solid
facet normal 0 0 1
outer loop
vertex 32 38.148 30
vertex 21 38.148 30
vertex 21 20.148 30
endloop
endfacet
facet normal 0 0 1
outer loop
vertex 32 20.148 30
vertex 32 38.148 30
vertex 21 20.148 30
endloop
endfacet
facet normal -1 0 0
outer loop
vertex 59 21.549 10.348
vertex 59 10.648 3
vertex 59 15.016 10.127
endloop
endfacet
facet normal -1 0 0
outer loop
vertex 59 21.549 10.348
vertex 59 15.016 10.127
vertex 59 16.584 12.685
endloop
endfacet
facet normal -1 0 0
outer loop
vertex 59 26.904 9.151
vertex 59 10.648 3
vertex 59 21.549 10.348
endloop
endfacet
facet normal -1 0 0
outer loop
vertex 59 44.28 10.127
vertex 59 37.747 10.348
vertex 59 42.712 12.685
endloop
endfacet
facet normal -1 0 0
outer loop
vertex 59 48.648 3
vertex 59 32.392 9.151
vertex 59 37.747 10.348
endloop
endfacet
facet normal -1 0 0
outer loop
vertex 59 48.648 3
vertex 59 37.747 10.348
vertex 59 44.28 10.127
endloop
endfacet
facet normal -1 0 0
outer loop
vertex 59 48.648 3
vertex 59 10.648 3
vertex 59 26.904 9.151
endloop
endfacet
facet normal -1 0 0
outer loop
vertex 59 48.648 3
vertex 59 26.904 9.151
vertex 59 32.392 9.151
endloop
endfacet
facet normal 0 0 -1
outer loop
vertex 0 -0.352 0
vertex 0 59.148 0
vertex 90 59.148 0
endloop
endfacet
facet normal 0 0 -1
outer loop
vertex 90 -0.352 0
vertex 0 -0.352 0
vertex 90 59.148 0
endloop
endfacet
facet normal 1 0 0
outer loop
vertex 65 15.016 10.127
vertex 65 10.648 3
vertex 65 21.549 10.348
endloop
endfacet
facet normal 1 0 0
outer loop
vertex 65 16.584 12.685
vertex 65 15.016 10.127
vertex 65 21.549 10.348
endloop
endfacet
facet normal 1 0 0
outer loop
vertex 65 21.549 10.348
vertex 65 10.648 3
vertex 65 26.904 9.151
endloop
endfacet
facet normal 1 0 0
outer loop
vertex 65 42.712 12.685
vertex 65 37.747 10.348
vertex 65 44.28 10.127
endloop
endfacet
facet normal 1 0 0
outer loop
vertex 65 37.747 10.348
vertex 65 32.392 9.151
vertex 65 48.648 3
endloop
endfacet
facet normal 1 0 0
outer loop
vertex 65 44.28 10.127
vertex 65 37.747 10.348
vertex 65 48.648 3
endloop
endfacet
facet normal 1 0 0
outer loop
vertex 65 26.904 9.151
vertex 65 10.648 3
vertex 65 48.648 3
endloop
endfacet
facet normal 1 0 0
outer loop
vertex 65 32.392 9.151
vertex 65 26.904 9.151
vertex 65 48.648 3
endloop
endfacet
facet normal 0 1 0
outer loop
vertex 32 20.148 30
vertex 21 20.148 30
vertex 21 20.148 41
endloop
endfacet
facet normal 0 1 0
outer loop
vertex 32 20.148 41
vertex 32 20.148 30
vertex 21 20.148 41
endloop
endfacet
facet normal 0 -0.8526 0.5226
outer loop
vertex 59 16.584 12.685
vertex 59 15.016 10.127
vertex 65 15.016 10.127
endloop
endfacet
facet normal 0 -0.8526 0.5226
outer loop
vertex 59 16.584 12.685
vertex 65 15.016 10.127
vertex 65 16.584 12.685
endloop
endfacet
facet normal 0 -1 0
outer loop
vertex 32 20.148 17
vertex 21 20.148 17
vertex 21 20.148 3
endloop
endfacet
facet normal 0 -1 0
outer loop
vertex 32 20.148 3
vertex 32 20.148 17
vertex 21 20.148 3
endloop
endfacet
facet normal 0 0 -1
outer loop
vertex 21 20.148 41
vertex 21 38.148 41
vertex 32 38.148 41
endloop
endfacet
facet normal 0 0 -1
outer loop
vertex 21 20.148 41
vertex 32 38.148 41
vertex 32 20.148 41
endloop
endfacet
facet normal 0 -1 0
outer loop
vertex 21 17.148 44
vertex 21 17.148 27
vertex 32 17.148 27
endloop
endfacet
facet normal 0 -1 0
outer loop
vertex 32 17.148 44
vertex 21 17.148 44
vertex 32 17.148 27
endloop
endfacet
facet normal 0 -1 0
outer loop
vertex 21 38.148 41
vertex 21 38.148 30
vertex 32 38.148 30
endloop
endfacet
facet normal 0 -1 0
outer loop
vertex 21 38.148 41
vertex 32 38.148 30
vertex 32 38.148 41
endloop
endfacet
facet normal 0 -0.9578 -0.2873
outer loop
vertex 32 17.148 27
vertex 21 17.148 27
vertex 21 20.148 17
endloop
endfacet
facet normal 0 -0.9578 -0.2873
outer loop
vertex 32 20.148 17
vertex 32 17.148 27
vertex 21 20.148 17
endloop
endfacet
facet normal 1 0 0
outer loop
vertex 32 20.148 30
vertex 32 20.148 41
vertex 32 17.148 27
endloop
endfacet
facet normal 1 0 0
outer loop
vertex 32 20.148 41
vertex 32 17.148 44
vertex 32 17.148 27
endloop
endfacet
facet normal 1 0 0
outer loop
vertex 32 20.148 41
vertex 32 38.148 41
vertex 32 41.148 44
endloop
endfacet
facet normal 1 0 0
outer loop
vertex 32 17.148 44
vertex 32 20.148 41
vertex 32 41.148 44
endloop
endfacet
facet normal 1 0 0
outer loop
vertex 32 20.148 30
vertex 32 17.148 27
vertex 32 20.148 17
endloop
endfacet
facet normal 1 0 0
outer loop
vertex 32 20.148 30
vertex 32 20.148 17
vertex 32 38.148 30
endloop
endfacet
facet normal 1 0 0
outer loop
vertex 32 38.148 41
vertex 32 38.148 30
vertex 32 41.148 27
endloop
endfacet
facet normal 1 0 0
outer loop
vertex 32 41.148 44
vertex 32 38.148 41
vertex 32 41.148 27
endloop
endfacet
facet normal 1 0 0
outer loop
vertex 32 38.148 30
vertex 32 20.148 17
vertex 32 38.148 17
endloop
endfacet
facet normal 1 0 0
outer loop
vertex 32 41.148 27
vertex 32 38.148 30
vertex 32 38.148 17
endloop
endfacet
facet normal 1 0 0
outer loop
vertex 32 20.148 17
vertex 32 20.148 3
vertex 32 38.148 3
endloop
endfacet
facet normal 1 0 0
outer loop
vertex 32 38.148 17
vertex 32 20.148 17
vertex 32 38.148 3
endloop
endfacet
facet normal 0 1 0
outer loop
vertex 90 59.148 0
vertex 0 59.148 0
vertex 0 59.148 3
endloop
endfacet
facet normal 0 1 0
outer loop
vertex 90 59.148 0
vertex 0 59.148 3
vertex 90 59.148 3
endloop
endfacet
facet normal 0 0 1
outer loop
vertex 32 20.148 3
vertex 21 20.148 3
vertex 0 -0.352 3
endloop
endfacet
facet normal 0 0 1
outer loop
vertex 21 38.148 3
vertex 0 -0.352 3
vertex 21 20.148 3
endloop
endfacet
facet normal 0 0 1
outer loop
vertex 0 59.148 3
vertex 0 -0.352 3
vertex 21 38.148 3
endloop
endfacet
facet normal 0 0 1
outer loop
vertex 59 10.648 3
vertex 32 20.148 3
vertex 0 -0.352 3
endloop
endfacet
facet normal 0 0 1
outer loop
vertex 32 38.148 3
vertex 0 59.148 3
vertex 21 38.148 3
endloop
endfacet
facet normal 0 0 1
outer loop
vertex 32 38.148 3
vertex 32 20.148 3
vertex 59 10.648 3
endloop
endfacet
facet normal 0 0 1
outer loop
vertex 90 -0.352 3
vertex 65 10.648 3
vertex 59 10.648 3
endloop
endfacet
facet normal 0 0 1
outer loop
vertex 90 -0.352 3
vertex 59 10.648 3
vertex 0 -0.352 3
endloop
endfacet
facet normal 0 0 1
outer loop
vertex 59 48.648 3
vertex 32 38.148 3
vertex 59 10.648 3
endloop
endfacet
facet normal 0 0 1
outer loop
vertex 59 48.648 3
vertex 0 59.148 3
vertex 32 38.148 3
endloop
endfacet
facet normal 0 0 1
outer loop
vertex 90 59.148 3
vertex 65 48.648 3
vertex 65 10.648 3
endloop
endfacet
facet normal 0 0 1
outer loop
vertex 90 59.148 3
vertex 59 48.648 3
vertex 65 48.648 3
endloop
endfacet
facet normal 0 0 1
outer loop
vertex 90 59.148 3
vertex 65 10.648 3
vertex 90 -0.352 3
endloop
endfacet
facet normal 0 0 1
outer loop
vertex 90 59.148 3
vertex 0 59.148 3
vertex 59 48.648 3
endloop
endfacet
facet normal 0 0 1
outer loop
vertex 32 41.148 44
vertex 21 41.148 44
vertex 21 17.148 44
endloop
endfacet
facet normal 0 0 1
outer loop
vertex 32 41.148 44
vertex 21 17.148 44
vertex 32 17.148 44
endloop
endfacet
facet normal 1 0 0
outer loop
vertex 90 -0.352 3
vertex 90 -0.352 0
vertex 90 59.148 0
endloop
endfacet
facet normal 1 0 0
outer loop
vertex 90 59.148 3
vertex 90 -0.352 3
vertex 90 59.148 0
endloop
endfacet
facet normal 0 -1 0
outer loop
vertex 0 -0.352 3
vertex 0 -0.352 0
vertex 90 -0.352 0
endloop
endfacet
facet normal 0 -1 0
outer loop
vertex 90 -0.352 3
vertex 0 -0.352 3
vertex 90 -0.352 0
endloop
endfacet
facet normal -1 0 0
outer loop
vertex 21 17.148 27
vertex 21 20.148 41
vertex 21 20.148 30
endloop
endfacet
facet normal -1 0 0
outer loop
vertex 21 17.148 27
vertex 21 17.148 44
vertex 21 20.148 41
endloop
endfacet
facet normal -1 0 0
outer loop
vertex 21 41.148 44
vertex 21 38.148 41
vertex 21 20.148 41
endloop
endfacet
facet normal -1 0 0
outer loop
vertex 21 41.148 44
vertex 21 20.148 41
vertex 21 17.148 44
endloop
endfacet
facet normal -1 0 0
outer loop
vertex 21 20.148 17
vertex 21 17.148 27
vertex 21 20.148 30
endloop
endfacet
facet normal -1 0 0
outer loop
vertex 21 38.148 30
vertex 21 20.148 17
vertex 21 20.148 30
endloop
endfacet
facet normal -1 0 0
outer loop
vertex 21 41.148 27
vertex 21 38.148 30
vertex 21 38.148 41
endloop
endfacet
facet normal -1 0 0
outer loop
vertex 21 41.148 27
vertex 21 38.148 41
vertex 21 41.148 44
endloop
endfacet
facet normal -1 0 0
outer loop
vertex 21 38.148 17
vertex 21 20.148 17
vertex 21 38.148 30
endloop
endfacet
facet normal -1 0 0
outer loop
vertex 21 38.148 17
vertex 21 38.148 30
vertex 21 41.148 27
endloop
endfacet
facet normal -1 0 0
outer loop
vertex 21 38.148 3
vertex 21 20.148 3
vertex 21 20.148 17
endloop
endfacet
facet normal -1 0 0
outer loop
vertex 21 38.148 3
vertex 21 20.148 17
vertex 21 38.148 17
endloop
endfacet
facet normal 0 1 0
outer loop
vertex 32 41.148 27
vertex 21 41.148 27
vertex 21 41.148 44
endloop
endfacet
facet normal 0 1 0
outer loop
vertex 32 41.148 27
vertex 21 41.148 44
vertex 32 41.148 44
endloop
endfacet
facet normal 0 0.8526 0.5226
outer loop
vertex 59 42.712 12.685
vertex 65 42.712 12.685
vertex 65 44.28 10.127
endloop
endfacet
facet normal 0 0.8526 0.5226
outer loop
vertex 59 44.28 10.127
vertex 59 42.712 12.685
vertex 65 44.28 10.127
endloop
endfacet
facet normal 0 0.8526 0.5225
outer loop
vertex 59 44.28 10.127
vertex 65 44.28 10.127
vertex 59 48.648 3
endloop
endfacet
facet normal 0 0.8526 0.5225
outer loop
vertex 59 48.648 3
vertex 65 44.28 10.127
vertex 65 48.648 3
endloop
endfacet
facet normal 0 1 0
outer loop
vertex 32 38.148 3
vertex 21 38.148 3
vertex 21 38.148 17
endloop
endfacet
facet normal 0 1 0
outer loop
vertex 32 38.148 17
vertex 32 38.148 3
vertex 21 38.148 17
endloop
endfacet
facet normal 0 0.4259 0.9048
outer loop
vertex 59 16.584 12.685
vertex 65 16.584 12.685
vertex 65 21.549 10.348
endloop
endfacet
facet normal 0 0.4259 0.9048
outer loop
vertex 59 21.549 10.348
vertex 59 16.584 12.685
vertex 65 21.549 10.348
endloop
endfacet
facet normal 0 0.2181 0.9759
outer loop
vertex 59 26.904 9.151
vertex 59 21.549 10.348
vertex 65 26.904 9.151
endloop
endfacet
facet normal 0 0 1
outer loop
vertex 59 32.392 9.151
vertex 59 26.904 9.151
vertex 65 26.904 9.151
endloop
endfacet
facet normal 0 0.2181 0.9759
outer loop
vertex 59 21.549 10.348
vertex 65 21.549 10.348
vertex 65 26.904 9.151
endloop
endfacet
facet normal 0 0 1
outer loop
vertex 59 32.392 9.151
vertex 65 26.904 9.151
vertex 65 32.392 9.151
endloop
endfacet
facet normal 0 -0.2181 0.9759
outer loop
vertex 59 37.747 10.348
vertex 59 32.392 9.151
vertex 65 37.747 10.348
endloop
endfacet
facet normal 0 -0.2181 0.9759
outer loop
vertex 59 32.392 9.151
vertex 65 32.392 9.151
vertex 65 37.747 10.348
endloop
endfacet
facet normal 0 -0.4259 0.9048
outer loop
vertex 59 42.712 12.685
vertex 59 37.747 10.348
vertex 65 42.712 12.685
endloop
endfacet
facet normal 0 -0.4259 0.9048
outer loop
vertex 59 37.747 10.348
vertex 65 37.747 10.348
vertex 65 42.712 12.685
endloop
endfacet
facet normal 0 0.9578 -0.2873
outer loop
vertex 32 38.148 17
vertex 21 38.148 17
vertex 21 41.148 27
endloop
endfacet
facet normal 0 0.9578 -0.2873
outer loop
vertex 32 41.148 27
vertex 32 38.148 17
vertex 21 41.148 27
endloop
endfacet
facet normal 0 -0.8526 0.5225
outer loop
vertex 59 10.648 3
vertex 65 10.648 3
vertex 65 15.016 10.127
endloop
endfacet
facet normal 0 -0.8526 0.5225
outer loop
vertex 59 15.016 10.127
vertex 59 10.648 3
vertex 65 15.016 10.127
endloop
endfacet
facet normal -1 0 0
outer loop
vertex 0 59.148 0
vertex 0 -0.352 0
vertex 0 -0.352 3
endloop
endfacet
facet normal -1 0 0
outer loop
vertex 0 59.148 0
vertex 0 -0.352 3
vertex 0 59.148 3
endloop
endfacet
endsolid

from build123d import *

# Parameters (mm, degrees)
F0_W     = 90
F0_H     = 59.5
F1_DEPTH = 3
F2_W     = 11
F2_H     = 24
F3_DEPTH = 41
F2_W_2   = 6
F2_H_2   = 56
F4_DEPTH = 31
F5_W     = 18
F5_H     = 11
F6_DEPTH = 15
F8_DEPTH = 10


with BuildPart() as f1:
    # F0 (on Top) → F1 (new body)
    with BuildSketch(Plane.XY):
        with Locations((45, 29.3979640784)):
            Rectangle(F0_W, F0_H)
    extrude(amount=F1_DEPTH)

    # F2 (on face) → F3 (join)
    with BuildSketch(Plane.XY.offset(3)):
        with Locations((26.5, 29.1479640784)):
            Rectangle(F2_W, F2_H)
    extrude(amount=F3_DEPTH)

    # F2 (on face) → F4 (join)
    with BuildSketch(Plane.XY.offset(3)):
        with Locations((62, 29.6479640784)):
            Rectangle(F2_W_2, F2_H_2)
    extrude(amount=F4_DEPTH)

    # F5 (on face) → F6 (cut)
    with BuildSketch(Plane(origin=(21, 0, 0), x_dir=(0, -1, 0), z_dir=(-1, 0, 0))):
        Polygon((-41.1479640784, 27), (-41.1479640784, 3), (-38.1479640784, 3), (-38.1479640784, 17), align=None)
        with Locations((-29.1479640784, 35.5)):
            Rectangle(F5_W, F5_H)
        Polygon((-20.1479640784, 17), (-20.1479640784, 3), (-17.1479640784, 3), (-17.1479640784, 27), align=None)
    extrude(amount=-F6_DEPTH, mode=Mode.SUBTRACT)

    # F7 (on face) → F8 (cut)
    with BuildSketch(Plane.YZ.offset(65)):
        with BuildLine():
            Line((29.6479640784, 34), (4.6479640784, 34))
            ThreePointArc((4.6479640784, 34), (7.8351090818, 21.7852811372), (16.5839126302, 12.6849686897))
            Line((16.5839126302, 12.6849686897), (29.6479640784, 34))
        make_face()
        with BuildLine():
            ThreePointArc((16.5839126302, 12.6849686897), (29.6479640784, 9), (42.7120155267, 12.6849686897))
            Line((42.7120155267, 12.6849686897), (29.6479640784, 34))
            Line((29.6479640784, 34), (16.5839126302, 12.6849686897))
        make_face()
        with BuildLine():
            ThreePointArc((42.7120155267, 12.6849686897), (51.460819075, 21.7852811372), (54.6479640784, 34))
            Line((54.6479640784, 34), (29.6479640784, 34))
            Line((29.6479640784, 34), (42.7120155267, 12.6849686897))
        make_face()
        with BuildLine():
            ThreePointArc((16.5839126302, 12.6849686897), (7.8351090818, 21.7852811372), (4.6479640784, 34))
            Line((4.6479640784, 34), (1.6479640784, 34))
            ThreePointArc((1.6479640784, 34), (5.2175664822, 20.3195148737), (15.0162264564, 10.1271649325))
            Line((15.0162264564, 10.1271649325), (16.5839126302, 12.6849686897))
        make_face()
        with BuildLine():
            ThreePointArc((15.0162264564, 10.1271649325), (5.2175664822, 20.3195148737), (1.6479640784, 34))
            Line((1.6479640784, 34), (1.6479640784, 3))
            Line((1.6479640784, 3), (10.6479640784, 3))
            Line((10.6479640784, 3), (15.0162264564, 10.1271649325))
        make_face()
        with BuildLine():
            Line((57.6479640784, 3), (57.6479640784, 34))
            ThreePointArc((57.6479640784, 34), (54.0783616746, 20.3195148737), (44.2797017005, 10.1271649325))
            Line((44.2797017005, 10.1271649325), (48.6479640784, 3))
            Line((48.6479640784, 3), (57.6479640784, 3))
        make_face()
        with BuildLine():
            Line((57.6479640784, 34), (54.6479640784, 34))
            ThreePointArc((54.6479640784, 34), (51.460819075, 21.7852811372), (42.7120155267, 12.6849686897))
            Line((42.7120155267, 12.6849686897), (44.2797017005, 10.1271649325))
            ThreePointArc((44.2797017005, 10.1271649325), (54.0783616746, 20.3195148737), (57.6479640784, 34))
        make_face()
    extrude(amount=-F8_DEPTH, mode=Mode.SUBTRACT)


solid = f1.part
